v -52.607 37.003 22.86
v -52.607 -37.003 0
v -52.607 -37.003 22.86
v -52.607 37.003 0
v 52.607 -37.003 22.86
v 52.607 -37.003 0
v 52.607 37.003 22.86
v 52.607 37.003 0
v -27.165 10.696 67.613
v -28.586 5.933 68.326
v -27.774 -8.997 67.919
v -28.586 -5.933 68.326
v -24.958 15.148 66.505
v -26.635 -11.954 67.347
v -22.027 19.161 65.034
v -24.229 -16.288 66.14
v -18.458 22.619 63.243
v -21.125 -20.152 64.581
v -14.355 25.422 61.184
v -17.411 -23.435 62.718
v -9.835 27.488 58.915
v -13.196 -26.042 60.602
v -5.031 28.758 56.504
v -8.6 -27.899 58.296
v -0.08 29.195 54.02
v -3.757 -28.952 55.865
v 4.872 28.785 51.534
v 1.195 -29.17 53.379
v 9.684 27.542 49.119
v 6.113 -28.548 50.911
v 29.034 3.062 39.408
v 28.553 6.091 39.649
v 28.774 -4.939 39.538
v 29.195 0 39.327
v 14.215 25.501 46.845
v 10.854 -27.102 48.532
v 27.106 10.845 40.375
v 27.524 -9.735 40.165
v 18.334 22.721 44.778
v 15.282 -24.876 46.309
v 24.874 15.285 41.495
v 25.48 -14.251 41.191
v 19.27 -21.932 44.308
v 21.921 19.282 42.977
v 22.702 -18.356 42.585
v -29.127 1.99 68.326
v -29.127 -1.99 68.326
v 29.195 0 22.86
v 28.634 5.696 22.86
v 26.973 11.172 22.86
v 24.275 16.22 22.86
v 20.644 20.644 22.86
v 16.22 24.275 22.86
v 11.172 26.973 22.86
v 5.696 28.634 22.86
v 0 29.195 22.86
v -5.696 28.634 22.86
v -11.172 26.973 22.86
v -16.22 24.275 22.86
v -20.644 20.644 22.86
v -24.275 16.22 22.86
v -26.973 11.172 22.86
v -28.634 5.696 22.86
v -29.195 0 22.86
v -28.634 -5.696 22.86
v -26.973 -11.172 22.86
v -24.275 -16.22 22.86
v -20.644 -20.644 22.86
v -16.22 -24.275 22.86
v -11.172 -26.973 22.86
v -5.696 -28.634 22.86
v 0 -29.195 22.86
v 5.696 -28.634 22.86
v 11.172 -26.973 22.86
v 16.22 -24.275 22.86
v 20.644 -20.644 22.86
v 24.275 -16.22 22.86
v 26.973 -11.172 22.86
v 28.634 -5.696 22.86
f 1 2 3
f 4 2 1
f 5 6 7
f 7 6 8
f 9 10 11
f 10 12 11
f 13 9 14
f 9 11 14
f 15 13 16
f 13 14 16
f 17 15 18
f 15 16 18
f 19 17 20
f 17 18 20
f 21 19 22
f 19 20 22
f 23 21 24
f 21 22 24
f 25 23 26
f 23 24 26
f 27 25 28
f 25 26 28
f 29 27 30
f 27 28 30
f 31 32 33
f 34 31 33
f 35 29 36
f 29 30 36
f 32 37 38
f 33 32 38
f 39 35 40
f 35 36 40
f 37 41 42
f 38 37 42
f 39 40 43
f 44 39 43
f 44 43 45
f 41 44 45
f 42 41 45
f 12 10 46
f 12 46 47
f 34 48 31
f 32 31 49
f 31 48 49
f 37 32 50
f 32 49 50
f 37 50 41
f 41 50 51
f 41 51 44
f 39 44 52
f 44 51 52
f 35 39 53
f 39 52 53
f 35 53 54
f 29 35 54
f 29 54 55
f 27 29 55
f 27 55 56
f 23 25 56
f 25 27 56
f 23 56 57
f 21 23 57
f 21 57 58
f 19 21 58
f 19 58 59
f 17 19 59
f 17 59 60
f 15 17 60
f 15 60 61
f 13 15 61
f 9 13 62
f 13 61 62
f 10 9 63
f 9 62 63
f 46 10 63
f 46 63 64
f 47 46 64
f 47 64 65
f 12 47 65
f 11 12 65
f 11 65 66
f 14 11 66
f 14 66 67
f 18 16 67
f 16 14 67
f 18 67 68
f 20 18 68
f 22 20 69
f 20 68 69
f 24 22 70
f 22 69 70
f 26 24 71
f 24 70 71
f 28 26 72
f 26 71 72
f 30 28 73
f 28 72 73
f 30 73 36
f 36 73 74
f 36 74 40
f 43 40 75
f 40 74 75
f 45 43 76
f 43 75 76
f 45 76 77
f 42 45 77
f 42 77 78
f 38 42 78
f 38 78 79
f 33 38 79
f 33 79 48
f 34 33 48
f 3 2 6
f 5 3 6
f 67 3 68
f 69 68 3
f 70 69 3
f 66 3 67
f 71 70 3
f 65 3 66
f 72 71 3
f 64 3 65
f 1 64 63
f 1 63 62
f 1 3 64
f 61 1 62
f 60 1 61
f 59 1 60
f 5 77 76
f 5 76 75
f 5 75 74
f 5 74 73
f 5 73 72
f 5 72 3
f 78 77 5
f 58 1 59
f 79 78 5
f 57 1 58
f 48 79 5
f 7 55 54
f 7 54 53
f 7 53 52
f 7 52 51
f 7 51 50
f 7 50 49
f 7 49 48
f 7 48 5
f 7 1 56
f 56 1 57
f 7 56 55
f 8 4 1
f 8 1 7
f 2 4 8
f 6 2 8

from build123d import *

# Parameters (mm, degrees)
F0_W          = 105.2140146494
F0_H          = 74.0064755082
F0_R          = 22.3889711498
F1_DEPTH      = 22.86
F2_DEPTH      = 59.944
F3_DEPTH      = 25.4
F3_FACE_R     = 22.3889711498
F4_DEPTH      = 25.4
F4_TAPER      = -3
F5_DEPTH      = 25.4
F5_DEPTH_BACK = 25.4
F5_FACE_R     = 22.3889711498
F6_DEPTH      = 25.4
F6_TAPER      = -15
F7_DEPTH      = 59.182
F9_DEPTH      = 33.274


with BuildPart() as f1:
    # F0 (on Top) → F1 (new body)
    with BuildSketch(Plane.XY):
        Rectangle(F0_W, F0_H)
        Circle(F0_R, mode=Mode.SUBTRACT)
        Circle(F0_R)
    extrude(amount=F1_DEPTH)

    # F0 (on Top) → F2 (join)
    with BuildSketch(Plane.XY):
        Circle(F0_R)
    extrude(amount=F2_DEPTH)

    # F3 (cut): a face of the model
    f3_faces = [f1.faces().sort_by_distance(p)[0] for p in [
        (0, 0, 59.944),
    ]]
    extrude(f3_faces, amount=-F3_DEPTH, mode=Mode.SUBTRACT)

    # F3_face (on face) → F4 (join)
    with BuildSketch(Plane.XY.offset(34.544)):
        Circle(F3_FACE_R)
    extrude(amount=F4_DEPTH, taper=F4_TAPER)

    # F5 (cut, two sides): a face of the model
    f5_faces = [f1.faces().sort_by_distance(p)[0] for p in [
        (0, 0, 59.944),
    ]]
    extrude(f5_faces, amount=-F5_DEPTH, mode=Mode.SUBTRACT)
    extrude(f5_faces, amount=F5_DEPTH_BACK, mode=Mode.SUBTRACT)

    # F5_face (on face) → F6 (cut)
    with BuildSketch(Plane.XY.offset(34.544)):
        Circle(F5_FACE_R)
    extrude(amount=-F6_DEPTH, taper=F6_TAPER, mode=Mode.SUBTRACT)

    # F7 (add): a face of the model
    f7_faces = [f1.faces().sort_by_distance(p)[0] for p in [
        (0, 0, 9.144),
    ]]
    extrude(f7_faces, amount=F7_DEPTH)

    # F8 (on Front) → F9 (cut, symmetric)
    with BuildSketch(Plane.XZ):
        Polygon((-21.8193475157, 85.7371985912), (-29.5202936977, 68.7951147556), (38.5047309101, 34.6542596817), (50.8262440562, 89.5876735449), align=None)
    extrude(amount=F9_DEPTH, both=True, mode=Mode.SUBTRACT)


solid = f1.part
